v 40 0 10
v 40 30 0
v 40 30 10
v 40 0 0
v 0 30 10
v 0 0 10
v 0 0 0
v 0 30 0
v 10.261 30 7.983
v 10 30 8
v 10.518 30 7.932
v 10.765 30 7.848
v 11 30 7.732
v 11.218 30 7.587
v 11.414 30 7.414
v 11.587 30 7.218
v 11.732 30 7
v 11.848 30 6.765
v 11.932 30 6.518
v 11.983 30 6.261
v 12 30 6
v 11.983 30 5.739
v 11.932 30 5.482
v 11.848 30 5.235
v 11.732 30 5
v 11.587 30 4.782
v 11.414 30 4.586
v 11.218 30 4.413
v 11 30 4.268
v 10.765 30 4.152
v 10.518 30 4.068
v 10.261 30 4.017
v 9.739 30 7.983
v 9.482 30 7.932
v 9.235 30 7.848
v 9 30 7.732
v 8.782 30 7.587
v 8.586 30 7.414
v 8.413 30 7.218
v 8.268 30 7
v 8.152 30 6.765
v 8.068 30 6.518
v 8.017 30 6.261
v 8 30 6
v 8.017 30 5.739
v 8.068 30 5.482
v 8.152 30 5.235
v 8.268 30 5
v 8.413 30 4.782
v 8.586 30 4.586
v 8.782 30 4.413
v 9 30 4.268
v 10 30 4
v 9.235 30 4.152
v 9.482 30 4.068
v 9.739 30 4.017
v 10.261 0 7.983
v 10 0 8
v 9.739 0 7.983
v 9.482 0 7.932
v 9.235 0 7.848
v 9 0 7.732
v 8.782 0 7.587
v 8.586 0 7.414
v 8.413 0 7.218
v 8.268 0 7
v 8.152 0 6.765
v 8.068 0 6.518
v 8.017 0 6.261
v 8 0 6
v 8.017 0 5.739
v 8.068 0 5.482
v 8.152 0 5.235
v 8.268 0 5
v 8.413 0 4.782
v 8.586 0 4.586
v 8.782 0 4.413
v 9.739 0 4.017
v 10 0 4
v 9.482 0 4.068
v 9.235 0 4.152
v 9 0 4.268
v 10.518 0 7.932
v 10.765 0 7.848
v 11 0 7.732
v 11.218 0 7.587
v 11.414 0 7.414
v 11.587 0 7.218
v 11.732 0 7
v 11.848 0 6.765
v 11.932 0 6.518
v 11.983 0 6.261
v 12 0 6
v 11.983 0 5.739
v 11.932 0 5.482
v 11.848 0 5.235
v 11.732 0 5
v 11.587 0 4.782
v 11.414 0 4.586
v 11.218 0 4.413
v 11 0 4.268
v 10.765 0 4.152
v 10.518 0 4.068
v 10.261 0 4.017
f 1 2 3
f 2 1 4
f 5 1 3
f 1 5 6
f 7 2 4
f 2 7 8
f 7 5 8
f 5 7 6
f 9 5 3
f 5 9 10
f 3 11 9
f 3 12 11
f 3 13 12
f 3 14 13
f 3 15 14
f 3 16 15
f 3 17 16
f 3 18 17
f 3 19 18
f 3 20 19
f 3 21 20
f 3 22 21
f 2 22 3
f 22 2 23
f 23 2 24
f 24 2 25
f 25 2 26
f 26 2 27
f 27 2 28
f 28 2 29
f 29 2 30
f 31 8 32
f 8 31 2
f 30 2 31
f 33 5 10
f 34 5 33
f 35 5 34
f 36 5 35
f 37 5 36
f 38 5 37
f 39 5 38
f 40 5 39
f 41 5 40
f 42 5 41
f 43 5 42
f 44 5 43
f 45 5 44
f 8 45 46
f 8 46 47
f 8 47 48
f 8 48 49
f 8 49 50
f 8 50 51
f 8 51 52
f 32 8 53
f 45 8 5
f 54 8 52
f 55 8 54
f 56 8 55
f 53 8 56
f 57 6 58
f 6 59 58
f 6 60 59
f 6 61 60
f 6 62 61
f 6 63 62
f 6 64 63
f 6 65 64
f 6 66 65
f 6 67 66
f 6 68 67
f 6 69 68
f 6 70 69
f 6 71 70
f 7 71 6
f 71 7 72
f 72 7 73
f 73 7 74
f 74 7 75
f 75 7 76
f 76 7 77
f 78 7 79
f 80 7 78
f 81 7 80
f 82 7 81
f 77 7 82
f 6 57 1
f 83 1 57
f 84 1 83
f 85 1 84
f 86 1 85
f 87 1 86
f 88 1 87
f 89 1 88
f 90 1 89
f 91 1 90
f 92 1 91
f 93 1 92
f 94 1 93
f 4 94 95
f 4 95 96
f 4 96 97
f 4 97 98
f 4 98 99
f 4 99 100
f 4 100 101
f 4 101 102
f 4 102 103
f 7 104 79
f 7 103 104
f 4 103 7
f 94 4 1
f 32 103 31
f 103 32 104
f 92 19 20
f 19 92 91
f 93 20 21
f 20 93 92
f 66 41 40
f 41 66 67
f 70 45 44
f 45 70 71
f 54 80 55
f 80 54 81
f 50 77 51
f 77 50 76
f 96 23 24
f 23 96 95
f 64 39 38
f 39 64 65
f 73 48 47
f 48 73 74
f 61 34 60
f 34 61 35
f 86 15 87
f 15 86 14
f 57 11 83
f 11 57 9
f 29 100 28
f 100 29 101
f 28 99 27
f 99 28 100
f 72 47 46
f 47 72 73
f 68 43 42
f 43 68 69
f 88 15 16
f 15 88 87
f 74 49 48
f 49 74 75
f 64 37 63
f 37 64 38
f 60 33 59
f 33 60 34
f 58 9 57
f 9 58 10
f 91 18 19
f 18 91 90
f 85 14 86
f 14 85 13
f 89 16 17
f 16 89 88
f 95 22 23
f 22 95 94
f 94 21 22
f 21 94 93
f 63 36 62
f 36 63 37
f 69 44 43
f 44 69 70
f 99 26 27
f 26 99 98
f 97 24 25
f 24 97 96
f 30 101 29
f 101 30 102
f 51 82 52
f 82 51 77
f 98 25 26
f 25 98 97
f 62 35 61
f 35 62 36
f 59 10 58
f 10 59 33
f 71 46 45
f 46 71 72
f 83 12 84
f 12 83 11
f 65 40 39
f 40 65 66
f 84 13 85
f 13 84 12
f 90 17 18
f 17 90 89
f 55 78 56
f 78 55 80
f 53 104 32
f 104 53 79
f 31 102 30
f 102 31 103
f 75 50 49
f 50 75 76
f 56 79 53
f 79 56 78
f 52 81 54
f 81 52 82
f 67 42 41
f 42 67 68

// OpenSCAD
// units=mm — generated by scad_emitter.py
// part=unnamed
$fn = 48;

difference() { cube([40, 30, 10]); translate([10, 30.5, 6]) rotate([90, 0, 0]) cylinder(h=31, r=2, $fn=$fn); }
